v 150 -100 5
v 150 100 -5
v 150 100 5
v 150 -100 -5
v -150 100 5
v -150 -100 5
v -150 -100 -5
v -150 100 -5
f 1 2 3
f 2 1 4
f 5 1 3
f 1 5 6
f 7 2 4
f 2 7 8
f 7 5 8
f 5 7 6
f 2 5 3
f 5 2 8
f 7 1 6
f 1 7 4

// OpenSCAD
// Parameters
plate_length = 300; //[150:600:1]
plate_width = 200; //[100:400:1]
plate_thickness = 10; //[5:20:1]
overlap = 1; //[0.5:2:0.5]

// Main tooling plate module
module tooling_plate() {
  color("Silver") // Aluminum color
  union() {
    // Base tooling plate body
    translate([0, 0, 0])
      cube([plate_length, plate_width, plate_thickness], center=true);

    // Placeholder for edge chamfer (no-op)
    translate([0, 0, 0])
      cube([plate_length, plate_width, plate_thickness], center=true);

    // Placeholder for corner radius (no-op)
    translate([0, 0, 0])
      cube([plate_length, plate_width, plate_thickness], center=true);

    // Placeholder for engraved label (no-op)
    translate([0, 0, 0])
      cube([plate_length, plate_width, plate_thickness], center=true);
  }
}

// Render the complete tooling plate
tooling_plate();
